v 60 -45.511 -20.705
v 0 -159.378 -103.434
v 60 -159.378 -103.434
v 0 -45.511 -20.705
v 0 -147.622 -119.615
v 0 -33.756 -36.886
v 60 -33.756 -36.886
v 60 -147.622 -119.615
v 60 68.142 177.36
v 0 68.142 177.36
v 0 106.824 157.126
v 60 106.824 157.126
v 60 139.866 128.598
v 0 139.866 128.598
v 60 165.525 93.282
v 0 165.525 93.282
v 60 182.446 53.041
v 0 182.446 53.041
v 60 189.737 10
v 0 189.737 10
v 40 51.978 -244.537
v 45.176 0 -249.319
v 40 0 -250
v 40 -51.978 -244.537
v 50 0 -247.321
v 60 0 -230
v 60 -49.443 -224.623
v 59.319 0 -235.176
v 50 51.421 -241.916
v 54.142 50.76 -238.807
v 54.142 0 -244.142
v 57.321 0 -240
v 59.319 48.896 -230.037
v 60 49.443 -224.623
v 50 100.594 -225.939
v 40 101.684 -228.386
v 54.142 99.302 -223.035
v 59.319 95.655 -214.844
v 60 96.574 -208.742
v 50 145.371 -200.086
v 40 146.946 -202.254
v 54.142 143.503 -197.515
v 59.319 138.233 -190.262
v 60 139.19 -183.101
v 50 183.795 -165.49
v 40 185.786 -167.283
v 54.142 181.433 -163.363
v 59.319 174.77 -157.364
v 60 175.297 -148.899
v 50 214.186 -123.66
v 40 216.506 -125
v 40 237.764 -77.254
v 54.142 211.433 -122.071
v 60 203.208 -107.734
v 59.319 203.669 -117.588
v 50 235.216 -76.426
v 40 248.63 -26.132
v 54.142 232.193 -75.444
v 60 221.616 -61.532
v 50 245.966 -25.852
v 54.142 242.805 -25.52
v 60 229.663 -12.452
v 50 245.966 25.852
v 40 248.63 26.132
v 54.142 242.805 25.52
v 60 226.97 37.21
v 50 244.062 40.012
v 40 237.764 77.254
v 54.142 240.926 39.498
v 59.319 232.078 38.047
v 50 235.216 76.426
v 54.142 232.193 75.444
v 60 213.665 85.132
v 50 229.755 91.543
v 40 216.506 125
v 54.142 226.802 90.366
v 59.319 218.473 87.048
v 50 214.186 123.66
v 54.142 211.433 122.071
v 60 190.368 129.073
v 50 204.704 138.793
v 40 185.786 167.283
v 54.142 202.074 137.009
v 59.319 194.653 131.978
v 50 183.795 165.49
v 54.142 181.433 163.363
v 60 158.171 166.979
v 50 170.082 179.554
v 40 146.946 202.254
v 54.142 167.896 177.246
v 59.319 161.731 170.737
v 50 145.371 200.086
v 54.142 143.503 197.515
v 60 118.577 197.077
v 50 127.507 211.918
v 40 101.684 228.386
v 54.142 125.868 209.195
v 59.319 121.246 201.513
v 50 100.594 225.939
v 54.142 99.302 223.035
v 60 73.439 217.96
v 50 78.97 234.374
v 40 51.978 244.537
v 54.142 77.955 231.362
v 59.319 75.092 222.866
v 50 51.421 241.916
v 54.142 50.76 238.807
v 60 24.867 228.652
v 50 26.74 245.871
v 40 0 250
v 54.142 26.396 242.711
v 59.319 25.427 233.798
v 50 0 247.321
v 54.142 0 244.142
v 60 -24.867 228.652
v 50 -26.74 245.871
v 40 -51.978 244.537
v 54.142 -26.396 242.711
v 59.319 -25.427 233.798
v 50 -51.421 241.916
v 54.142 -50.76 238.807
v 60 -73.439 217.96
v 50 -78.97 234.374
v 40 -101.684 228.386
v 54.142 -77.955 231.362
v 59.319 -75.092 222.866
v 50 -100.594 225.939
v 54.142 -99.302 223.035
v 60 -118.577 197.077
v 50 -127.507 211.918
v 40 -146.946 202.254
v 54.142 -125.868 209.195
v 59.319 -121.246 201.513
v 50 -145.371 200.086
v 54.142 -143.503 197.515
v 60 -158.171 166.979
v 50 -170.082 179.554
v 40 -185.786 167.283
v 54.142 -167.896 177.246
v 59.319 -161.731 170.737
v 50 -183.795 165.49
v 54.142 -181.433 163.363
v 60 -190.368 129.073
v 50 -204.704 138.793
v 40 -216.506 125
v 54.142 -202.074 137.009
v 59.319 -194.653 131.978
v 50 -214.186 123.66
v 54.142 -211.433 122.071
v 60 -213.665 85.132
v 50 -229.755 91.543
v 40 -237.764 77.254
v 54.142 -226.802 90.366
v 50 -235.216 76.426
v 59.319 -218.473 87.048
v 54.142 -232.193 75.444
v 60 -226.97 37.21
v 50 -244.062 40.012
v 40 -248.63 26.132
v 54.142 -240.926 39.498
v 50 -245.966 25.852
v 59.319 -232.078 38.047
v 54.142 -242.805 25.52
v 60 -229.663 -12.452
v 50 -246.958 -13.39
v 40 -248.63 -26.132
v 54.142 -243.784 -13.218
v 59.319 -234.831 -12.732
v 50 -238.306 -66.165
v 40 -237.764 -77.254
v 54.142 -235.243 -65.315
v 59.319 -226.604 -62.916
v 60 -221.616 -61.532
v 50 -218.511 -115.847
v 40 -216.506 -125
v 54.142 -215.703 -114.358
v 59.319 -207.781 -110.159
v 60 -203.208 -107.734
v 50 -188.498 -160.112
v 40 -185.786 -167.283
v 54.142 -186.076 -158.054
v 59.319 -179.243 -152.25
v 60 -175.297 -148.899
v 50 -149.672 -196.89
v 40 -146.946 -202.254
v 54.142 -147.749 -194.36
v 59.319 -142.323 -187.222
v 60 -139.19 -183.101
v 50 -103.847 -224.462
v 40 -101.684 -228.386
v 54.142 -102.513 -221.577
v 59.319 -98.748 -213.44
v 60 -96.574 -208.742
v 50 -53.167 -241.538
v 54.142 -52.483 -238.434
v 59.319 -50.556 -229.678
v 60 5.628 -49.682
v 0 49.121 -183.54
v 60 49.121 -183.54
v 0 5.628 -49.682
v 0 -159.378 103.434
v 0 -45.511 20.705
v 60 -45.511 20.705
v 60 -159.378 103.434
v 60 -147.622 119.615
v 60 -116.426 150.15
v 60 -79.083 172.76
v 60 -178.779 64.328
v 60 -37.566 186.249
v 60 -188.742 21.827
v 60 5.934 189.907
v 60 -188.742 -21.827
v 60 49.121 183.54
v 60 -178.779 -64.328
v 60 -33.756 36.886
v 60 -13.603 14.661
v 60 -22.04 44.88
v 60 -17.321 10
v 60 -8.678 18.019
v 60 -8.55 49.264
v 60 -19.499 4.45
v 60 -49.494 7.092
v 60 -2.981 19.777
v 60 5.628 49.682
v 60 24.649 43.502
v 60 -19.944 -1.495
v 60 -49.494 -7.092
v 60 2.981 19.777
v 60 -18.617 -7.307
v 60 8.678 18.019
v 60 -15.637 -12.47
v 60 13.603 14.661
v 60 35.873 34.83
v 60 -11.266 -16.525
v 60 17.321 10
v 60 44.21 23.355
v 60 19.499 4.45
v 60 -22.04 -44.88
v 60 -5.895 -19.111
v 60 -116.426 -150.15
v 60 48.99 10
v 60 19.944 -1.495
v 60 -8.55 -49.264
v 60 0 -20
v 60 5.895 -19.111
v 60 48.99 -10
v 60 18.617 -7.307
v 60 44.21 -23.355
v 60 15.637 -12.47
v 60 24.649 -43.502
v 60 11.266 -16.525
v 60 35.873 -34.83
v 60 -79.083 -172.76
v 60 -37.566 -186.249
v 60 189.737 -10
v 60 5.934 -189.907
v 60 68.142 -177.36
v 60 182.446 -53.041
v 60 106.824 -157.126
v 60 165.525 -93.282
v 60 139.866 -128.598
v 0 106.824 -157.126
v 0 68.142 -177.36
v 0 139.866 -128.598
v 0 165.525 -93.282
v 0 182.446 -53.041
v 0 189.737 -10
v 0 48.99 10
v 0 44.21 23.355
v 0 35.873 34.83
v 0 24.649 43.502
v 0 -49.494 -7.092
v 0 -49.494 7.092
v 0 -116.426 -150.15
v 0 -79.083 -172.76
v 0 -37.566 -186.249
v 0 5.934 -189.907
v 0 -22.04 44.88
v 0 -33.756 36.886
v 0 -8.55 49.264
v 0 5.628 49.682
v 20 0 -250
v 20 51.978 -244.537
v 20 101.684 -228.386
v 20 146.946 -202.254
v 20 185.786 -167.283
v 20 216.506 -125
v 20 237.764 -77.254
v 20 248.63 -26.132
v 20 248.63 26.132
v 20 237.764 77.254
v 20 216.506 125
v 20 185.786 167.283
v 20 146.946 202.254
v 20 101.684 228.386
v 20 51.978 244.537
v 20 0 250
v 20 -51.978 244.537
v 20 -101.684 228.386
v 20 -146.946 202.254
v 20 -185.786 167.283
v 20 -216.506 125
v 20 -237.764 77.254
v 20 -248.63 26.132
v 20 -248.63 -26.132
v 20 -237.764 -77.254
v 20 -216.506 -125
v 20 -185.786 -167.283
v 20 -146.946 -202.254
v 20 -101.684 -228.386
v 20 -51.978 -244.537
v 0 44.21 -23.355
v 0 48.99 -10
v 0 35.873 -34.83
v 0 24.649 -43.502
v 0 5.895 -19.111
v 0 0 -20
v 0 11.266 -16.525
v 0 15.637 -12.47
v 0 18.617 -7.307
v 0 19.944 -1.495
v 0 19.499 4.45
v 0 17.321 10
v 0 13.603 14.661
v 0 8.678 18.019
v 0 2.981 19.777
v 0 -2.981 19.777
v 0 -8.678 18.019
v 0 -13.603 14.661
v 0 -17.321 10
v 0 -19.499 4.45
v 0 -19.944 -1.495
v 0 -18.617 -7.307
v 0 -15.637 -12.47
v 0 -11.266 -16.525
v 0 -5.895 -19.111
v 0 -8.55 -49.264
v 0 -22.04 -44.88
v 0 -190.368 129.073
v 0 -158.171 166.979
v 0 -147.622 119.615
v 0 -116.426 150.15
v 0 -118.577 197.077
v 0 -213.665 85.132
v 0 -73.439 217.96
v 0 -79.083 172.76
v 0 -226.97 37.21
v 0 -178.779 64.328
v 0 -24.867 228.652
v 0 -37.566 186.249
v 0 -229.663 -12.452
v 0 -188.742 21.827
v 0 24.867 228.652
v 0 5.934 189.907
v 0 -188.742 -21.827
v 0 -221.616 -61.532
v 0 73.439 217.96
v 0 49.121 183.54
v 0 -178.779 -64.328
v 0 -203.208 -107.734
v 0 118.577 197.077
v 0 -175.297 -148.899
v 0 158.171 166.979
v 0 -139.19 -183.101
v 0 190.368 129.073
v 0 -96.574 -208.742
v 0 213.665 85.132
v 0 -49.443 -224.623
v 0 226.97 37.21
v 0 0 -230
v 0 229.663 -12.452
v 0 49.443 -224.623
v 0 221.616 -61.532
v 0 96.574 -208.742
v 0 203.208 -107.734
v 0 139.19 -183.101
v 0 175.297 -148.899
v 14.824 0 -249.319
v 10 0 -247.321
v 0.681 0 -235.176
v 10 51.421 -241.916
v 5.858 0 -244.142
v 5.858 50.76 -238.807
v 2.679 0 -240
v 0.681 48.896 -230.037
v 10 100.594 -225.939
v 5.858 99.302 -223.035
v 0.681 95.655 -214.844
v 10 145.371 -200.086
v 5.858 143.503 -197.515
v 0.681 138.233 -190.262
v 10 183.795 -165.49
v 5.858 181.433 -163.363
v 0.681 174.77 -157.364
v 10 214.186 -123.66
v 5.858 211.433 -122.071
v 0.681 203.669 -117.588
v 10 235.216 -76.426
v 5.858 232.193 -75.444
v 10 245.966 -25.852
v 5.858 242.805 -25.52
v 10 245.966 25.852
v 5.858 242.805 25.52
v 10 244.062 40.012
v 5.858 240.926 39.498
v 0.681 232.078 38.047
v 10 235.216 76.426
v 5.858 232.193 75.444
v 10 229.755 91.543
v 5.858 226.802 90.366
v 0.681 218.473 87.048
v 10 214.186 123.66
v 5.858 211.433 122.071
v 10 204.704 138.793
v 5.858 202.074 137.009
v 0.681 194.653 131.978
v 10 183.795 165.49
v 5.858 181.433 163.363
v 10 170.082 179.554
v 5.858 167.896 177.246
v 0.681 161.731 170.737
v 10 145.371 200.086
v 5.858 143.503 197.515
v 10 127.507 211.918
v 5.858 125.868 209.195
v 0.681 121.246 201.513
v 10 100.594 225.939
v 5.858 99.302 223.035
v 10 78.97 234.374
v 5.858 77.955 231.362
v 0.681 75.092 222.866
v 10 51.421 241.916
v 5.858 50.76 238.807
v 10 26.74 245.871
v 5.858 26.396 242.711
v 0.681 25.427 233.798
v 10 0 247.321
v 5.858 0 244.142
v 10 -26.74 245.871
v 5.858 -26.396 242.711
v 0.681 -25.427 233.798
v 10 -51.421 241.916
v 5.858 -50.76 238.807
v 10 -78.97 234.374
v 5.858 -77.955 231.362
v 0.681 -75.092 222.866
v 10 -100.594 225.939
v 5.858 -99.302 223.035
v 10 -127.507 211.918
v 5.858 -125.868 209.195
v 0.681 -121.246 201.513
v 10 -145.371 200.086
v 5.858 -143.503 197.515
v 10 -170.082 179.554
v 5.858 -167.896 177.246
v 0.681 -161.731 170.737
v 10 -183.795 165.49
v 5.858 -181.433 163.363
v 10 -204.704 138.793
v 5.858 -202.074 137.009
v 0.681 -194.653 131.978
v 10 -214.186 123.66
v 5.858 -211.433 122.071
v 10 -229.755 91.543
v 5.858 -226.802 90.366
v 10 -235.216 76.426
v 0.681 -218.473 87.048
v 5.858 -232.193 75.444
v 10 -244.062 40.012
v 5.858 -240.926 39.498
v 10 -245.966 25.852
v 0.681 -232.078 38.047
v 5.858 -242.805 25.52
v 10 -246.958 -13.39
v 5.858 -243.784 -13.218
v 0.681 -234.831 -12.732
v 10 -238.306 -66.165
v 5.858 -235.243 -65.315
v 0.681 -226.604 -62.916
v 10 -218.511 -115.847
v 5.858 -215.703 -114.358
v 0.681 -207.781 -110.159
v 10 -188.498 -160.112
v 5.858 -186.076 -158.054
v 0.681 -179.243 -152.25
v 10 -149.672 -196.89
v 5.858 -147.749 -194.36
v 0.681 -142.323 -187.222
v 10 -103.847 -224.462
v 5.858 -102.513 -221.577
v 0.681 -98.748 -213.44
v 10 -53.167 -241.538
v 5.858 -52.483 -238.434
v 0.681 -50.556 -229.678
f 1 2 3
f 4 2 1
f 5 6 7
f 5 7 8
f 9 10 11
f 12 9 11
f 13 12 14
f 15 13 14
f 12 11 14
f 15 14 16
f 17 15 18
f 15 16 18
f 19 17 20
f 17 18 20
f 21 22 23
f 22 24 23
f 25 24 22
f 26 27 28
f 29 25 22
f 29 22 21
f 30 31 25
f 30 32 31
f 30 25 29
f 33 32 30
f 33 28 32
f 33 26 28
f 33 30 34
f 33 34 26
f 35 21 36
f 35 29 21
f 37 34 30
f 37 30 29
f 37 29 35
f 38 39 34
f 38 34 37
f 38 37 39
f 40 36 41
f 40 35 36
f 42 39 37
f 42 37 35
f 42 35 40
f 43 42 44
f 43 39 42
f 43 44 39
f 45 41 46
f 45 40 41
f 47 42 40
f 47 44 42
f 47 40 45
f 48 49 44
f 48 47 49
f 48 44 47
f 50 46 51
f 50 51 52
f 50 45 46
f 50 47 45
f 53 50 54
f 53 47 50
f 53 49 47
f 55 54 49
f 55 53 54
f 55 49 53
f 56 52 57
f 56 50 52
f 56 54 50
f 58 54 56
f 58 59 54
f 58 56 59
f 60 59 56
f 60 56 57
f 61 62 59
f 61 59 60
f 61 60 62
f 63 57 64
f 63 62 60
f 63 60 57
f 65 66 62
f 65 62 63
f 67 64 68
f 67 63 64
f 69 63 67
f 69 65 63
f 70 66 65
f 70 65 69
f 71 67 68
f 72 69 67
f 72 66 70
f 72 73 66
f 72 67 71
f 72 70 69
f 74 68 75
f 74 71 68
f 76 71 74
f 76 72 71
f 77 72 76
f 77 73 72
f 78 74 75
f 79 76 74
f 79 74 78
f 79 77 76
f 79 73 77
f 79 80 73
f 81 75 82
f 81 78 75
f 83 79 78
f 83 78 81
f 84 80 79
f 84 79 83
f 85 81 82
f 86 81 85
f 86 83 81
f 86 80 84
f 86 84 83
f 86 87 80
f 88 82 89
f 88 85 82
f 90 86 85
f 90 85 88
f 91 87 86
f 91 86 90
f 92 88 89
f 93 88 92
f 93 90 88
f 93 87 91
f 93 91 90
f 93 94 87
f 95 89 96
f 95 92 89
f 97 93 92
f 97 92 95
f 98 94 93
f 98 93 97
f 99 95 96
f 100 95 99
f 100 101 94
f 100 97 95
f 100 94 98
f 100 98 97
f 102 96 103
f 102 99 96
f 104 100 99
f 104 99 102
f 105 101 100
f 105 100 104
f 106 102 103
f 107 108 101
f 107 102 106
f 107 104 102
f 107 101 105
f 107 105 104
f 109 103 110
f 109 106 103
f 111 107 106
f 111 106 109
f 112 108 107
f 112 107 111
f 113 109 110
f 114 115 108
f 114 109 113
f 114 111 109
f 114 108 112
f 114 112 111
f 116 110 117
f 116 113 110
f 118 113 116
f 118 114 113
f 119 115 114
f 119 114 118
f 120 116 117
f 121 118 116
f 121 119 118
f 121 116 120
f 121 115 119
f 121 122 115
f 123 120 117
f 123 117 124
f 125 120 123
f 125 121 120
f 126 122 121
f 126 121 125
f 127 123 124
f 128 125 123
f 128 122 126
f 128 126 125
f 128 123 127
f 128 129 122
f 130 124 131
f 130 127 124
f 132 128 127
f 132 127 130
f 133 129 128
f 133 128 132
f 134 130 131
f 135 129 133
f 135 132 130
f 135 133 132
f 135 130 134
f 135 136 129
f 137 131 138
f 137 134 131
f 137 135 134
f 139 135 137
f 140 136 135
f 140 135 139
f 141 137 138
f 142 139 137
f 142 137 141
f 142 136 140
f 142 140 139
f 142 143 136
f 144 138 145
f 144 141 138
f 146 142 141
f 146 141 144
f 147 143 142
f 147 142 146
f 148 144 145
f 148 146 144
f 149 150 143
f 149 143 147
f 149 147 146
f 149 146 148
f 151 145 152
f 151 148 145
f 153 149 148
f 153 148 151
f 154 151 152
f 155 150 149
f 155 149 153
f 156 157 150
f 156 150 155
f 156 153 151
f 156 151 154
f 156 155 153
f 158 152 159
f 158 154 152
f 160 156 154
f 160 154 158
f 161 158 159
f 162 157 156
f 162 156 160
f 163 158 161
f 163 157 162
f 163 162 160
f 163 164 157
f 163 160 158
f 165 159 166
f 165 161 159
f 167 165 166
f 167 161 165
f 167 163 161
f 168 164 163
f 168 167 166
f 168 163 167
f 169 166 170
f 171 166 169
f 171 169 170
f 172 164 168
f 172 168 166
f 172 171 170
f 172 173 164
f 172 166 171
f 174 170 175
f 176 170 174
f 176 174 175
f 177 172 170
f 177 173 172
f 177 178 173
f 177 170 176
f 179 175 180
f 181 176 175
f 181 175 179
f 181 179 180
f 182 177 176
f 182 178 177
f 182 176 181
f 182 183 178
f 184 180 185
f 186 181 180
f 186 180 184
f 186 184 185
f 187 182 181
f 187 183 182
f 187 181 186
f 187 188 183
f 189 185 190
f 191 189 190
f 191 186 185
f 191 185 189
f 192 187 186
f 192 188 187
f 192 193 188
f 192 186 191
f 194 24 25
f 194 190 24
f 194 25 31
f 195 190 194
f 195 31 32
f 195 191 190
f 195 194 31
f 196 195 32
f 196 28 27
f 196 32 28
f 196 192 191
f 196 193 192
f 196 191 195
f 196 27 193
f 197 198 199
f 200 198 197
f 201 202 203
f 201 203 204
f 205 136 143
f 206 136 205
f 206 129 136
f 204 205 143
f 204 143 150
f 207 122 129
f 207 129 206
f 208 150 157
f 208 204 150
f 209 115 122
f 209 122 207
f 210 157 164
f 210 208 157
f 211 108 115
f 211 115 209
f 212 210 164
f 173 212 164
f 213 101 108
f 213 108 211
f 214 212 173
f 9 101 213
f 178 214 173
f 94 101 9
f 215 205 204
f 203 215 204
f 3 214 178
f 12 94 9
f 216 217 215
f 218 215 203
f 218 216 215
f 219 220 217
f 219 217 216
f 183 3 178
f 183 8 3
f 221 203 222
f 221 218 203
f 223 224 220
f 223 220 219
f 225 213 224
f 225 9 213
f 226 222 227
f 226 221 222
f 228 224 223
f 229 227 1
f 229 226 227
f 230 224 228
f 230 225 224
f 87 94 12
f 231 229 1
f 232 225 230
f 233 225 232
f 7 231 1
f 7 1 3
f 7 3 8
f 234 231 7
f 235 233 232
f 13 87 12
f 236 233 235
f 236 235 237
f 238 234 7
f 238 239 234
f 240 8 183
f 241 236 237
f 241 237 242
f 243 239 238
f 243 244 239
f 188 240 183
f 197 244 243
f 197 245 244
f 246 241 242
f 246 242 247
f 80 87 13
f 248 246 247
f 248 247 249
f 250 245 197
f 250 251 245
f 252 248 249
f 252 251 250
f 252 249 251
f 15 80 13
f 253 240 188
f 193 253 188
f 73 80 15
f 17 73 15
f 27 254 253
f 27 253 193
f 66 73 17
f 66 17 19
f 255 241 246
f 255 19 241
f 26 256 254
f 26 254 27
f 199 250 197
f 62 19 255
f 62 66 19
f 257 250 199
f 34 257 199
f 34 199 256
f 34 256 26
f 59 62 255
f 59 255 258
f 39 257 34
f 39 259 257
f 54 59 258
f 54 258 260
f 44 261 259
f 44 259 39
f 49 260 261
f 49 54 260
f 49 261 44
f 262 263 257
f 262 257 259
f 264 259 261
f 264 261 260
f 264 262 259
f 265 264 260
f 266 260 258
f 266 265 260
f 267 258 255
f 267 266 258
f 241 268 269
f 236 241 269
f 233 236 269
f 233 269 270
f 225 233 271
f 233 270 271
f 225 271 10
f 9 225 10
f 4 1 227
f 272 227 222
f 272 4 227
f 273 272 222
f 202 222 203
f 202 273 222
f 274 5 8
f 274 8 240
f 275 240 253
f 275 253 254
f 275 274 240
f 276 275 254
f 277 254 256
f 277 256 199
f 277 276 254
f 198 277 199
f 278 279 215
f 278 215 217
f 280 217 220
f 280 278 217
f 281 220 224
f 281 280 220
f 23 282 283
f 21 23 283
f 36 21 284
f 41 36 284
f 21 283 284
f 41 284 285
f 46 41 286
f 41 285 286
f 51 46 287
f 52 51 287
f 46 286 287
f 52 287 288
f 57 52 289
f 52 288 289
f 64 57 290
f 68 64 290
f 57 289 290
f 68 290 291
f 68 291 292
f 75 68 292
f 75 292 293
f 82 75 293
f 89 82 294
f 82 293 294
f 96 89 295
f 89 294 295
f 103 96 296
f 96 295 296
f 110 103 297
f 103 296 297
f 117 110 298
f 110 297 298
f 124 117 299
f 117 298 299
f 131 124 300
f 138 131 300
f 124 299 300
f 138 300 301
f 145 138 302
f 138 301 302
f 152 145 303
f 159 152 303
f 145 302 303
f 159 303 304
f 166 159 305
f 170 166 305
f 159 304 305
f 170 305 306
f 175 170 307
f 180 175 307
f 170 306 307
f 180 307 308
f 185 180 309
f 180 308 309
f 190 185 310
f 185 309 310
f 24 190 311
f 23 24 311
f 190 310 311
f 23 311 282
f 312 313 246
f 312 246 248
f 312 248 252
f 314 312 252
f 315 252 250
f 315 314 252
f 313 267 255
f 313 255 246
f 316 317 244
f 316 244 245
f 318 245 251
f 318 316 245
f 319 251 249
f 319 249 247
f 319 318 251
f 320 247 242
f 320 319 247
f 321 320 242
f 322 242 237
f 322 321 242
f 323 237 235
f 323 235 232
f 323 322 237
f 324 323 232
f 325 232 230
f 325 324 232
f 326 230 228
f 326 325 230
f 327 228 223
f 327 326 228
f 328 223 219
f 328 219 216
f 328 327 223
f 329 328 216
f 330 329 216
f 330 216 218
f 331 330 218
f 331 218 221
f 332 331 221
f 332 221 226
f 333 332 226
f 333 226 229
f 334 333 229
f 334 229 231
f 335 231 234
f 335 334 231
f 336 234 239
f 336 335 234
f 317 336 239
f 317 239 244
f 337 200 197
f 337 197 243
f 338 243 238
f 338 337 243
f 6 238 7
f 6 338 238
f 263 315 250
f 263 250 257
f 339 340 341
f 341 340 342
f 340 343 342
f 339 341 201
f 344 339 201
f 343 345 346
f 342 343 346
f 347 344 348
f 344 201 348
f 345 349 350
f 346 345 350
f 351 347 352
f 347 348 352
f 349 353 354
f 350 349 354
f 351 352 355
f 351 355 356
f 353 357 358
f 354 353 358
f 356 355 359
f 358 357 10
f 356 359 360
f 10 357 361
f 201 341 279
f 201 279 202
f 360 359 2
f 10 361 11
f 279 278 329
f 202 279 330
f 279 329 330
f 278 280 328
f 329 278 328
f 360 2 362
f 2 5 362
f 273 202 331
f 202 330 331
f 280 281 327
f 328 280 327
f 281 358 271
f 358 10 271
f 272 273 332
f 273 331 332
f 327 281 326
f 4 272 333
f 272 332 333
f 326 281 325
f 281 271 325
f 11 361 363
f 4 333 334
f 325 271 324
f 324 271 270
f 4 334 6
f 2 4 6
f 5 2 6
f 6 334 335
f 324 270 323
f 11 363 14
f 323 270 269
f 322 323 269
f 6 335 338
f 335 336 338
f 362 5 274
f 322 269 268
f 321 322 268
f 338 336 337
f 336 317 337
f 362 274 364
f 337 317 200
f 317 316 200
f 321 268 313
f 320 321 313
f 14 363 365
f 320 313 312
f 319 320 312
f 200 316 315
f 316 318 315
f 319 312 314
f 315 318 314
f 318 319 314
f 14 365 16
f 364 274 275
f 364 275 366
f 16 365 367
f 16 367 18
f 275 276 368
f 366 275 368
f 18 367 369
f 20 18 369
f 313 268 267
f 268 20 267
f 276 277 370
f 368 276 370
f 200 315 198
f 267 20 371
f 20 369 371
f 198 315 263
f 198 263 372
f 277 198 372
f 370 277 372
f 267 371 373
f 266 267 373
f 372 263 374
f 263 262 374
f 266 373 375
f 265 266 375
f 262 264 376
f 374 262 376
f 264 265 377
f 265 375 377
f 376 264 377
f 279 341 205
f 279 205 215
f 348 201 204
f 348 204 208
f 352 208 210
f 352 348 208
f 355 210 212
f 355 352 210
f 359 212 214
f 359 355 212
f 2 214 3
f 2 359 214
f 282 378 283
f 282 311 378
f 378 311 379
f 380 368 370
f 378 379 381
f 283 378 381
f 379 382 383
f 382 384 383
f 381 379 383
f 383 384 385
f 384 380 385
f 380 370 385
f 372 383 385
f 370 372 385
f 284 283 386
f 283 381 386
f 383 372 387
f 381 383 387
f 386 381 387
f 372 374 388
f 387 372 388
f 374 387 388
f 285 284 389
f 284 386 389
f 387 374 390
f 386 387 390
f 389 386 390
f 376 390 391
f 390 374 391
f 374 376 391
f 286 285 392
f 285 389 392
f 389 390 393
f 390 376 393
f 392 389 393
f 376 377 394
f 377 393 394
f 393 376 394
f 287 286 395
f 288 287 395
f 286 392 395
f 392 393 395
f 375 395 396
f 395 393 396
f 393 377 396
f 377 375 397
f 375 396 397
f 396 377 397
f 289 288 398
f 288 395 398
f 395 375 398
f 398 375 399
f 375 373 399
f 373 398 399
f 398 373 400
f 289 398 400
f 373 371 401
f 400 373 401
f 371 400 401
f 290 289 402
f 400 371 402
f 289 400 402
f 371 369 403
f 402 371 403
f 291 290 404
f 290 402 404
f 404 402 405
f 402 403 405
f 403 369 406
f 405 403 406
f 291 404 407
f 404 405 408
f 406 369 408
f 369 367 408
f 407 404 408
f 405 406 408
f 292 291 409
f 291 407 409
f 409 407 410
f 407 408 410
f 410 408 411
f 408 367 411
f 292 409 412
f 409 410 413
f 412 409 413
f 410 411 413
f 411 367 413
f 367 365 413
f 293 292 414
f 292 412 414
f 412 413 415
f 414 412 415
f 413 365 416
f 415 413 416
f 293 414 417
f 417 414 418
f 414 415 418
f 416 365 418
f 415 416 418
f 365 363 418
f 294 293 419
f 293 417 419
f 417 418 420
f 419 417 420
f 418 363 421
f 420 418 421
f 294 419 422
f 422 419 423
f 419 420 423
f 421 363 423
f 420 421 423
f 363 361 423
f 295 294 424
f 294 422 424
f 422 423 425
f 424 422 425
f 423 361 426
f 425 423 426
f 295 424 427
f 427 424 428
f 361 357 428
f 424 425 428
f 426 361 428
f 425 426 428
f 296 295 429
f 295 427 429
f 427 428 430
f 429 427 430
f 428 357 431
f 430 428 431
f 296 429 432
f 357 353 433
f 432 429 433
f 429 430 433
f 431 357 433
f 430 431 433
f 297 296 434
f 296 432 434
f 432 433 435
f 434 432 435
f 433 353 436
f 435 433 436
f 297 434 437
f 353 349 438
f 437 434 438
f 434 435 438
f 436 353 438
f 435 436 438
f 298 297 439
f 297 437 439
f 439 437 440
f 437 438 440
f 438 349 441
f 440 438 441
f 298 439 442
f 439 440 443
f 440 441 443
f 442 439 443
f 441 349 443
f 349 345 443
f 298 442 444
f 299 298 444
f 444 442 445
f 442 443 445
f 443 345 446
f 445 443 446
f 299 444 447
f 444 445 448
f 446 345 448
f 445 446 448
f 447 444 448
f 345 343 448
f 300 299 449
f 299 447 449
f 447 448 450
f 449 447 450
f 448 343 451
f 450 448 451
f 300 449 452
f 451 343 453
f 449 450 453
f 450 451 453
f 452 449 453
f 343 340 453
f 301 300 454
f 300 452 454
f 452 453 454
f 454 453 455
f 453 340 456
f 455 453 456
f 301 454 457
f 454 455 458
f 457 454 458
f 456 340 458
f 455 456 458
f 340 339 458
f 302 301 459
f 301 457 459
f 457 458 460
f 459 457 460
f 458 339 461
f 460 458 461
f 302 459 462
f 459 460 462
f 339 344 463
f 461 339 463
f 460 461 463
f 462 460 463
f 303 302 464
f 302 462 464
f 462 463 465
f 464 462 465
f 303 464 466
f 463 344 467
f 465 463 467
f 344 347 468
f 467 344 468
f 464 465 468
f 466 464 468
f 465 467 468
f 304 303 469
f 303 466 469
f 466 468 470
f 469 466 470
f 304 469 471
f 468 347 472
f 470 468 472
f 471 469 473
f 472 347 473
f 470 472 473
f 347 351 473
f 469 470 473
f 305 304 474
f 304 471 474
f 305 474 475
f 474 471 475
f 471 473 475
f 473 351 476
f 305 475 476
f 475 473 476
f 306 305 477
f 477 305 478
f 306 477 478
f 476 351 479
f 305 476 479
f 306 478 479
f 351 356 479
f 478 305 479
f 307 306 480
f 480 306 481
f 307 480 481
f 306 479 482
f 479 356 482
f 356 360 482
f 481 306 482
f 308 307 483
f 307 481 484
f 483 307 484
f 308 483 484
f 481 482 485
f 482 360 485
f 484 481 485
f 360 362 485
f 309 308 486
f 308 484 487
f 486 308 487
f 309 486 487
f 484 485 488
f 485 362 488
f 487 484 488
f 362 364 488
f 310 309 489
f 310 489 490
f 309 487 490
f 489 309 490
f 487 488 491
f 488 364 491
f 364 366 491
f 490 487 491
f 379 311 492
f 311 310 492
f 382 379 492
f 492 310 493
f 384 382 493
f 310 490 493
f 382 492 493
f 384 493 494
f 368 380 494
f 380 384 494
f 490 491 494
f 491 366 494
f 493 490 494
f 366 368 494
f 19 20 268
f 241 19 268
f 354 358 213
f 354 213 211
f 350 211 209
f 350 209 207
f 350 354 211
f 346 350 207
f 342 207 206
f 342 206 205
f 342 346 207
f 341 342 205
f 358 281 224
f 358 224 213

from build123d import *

# Parameters (mm, degrees)
SKETCH1_R           = 250
SKETCH1_R_2         = 20
BOSS_EXTRUDE1_DEPTH = 60
FILLET1_R           = 20


with BuildPart() as part:
    # Sketch1 → Boss-Extrude1 (new body)
    with BuildSketch(Plane(origin=(0, 0, 0), x_dir=(0, 0, -1), z_dir=(1, 0, 0))):
        Circle(SKETCH1_R)
        Circle(SKETCH1_R_2, mode=Mode.SUBTRACT)
        with BuildLine():
            Line((183.540456446, 49.121287113), (49.682233573, 5.628113998))
            ThreePointArc((49.682233573, 5.628113998), (47.552825815, -15.450849719), (36.885648873, -33.755724066))
            Line((36.885648873, -33.755724066), (119.614580282, -147.622329558))
            ThreePointArc((119.614580282, -147.622329558), (180.700738096, -58.713228931), (183.540456446, 49.121287113))
        make_face(mode=Mode.SUBTRACT)
        with BuildLine():
            Line((-10, 189.73665961), (-10, 48.989794856))
            ThreePointArc((-10, 48.989794856), (-29.389262615, 40.450849719), (-43.501893686, 24.649244324))
            Line((-43.501893686, 24.649244324), (-177.360116559, 68.142417438))
            ThreePointArc((-177.360116559, 68.142417438), (-111.679197936, 153.713228931), (-10, 189.73665961))
        make_face(mode=Mode.SUBTRACT)
        with BuildLine():
            Line((10, 189.73665961), (10, 48.989794856))
            ThreePointArc((10, 48.989794856), (29.389262615, 40.450849719), (43.501893686, 24.649244324))
            Line((43.501893686, 24.649244324), (177.360116559, 68.142417438))
            ThreePointArc((177.360116559, 68.142417438), (111.679197936, 153.713228931), (10, 189.73665961))
        make_face(mode=Mode.SUBTRACT)
        with BuildLine():
            Line((103.434240394, -159.378034603), (20.705308985, -45.511429112))
            ThreePointArc((20.705308985, -45.511429112), (0, -50), (-20.705308985, -45.511429112))
            Line((-20.705308985, -45.511429112), (-103.434240394, -159.378034603))
            ThreePointArc((-103.434240394, -159.378034603), (0, -190), (103.434240394, -159.378034603))
        make_face(mode=Mode.SUBTRACT)
        with BuildLine():
            Line((-119.614580282, -147.622329558), (-36.885648873, -33.755724066))
            ThreePointArc((-36.885648873, -33.755724066), (-47.552825815, -15.450849719), (-49.682233573, 5.628113998))
            Line((-49.682233573, 5.628113998), (-183.540456446, 49.121287113))
            ThreePointArc((-183.540456446, 49.121287113), (-180.700738096, -58.713228931), (-119.614580282, -147.622329558))
        make_face(mode=Mode.SUBTRACT)
    extrude(amount=BOSS_EXTRUDE1_DEPTH)

    # Fillet1
    fillet1_edges = [part.edges().sort_by_distance(p)[0] for p in [
        (0, 0, 250),
        (60, 0, 250),
    ]]
    fillet(fillet1_edges, radius=FILLET1_R)


solid = part.part
